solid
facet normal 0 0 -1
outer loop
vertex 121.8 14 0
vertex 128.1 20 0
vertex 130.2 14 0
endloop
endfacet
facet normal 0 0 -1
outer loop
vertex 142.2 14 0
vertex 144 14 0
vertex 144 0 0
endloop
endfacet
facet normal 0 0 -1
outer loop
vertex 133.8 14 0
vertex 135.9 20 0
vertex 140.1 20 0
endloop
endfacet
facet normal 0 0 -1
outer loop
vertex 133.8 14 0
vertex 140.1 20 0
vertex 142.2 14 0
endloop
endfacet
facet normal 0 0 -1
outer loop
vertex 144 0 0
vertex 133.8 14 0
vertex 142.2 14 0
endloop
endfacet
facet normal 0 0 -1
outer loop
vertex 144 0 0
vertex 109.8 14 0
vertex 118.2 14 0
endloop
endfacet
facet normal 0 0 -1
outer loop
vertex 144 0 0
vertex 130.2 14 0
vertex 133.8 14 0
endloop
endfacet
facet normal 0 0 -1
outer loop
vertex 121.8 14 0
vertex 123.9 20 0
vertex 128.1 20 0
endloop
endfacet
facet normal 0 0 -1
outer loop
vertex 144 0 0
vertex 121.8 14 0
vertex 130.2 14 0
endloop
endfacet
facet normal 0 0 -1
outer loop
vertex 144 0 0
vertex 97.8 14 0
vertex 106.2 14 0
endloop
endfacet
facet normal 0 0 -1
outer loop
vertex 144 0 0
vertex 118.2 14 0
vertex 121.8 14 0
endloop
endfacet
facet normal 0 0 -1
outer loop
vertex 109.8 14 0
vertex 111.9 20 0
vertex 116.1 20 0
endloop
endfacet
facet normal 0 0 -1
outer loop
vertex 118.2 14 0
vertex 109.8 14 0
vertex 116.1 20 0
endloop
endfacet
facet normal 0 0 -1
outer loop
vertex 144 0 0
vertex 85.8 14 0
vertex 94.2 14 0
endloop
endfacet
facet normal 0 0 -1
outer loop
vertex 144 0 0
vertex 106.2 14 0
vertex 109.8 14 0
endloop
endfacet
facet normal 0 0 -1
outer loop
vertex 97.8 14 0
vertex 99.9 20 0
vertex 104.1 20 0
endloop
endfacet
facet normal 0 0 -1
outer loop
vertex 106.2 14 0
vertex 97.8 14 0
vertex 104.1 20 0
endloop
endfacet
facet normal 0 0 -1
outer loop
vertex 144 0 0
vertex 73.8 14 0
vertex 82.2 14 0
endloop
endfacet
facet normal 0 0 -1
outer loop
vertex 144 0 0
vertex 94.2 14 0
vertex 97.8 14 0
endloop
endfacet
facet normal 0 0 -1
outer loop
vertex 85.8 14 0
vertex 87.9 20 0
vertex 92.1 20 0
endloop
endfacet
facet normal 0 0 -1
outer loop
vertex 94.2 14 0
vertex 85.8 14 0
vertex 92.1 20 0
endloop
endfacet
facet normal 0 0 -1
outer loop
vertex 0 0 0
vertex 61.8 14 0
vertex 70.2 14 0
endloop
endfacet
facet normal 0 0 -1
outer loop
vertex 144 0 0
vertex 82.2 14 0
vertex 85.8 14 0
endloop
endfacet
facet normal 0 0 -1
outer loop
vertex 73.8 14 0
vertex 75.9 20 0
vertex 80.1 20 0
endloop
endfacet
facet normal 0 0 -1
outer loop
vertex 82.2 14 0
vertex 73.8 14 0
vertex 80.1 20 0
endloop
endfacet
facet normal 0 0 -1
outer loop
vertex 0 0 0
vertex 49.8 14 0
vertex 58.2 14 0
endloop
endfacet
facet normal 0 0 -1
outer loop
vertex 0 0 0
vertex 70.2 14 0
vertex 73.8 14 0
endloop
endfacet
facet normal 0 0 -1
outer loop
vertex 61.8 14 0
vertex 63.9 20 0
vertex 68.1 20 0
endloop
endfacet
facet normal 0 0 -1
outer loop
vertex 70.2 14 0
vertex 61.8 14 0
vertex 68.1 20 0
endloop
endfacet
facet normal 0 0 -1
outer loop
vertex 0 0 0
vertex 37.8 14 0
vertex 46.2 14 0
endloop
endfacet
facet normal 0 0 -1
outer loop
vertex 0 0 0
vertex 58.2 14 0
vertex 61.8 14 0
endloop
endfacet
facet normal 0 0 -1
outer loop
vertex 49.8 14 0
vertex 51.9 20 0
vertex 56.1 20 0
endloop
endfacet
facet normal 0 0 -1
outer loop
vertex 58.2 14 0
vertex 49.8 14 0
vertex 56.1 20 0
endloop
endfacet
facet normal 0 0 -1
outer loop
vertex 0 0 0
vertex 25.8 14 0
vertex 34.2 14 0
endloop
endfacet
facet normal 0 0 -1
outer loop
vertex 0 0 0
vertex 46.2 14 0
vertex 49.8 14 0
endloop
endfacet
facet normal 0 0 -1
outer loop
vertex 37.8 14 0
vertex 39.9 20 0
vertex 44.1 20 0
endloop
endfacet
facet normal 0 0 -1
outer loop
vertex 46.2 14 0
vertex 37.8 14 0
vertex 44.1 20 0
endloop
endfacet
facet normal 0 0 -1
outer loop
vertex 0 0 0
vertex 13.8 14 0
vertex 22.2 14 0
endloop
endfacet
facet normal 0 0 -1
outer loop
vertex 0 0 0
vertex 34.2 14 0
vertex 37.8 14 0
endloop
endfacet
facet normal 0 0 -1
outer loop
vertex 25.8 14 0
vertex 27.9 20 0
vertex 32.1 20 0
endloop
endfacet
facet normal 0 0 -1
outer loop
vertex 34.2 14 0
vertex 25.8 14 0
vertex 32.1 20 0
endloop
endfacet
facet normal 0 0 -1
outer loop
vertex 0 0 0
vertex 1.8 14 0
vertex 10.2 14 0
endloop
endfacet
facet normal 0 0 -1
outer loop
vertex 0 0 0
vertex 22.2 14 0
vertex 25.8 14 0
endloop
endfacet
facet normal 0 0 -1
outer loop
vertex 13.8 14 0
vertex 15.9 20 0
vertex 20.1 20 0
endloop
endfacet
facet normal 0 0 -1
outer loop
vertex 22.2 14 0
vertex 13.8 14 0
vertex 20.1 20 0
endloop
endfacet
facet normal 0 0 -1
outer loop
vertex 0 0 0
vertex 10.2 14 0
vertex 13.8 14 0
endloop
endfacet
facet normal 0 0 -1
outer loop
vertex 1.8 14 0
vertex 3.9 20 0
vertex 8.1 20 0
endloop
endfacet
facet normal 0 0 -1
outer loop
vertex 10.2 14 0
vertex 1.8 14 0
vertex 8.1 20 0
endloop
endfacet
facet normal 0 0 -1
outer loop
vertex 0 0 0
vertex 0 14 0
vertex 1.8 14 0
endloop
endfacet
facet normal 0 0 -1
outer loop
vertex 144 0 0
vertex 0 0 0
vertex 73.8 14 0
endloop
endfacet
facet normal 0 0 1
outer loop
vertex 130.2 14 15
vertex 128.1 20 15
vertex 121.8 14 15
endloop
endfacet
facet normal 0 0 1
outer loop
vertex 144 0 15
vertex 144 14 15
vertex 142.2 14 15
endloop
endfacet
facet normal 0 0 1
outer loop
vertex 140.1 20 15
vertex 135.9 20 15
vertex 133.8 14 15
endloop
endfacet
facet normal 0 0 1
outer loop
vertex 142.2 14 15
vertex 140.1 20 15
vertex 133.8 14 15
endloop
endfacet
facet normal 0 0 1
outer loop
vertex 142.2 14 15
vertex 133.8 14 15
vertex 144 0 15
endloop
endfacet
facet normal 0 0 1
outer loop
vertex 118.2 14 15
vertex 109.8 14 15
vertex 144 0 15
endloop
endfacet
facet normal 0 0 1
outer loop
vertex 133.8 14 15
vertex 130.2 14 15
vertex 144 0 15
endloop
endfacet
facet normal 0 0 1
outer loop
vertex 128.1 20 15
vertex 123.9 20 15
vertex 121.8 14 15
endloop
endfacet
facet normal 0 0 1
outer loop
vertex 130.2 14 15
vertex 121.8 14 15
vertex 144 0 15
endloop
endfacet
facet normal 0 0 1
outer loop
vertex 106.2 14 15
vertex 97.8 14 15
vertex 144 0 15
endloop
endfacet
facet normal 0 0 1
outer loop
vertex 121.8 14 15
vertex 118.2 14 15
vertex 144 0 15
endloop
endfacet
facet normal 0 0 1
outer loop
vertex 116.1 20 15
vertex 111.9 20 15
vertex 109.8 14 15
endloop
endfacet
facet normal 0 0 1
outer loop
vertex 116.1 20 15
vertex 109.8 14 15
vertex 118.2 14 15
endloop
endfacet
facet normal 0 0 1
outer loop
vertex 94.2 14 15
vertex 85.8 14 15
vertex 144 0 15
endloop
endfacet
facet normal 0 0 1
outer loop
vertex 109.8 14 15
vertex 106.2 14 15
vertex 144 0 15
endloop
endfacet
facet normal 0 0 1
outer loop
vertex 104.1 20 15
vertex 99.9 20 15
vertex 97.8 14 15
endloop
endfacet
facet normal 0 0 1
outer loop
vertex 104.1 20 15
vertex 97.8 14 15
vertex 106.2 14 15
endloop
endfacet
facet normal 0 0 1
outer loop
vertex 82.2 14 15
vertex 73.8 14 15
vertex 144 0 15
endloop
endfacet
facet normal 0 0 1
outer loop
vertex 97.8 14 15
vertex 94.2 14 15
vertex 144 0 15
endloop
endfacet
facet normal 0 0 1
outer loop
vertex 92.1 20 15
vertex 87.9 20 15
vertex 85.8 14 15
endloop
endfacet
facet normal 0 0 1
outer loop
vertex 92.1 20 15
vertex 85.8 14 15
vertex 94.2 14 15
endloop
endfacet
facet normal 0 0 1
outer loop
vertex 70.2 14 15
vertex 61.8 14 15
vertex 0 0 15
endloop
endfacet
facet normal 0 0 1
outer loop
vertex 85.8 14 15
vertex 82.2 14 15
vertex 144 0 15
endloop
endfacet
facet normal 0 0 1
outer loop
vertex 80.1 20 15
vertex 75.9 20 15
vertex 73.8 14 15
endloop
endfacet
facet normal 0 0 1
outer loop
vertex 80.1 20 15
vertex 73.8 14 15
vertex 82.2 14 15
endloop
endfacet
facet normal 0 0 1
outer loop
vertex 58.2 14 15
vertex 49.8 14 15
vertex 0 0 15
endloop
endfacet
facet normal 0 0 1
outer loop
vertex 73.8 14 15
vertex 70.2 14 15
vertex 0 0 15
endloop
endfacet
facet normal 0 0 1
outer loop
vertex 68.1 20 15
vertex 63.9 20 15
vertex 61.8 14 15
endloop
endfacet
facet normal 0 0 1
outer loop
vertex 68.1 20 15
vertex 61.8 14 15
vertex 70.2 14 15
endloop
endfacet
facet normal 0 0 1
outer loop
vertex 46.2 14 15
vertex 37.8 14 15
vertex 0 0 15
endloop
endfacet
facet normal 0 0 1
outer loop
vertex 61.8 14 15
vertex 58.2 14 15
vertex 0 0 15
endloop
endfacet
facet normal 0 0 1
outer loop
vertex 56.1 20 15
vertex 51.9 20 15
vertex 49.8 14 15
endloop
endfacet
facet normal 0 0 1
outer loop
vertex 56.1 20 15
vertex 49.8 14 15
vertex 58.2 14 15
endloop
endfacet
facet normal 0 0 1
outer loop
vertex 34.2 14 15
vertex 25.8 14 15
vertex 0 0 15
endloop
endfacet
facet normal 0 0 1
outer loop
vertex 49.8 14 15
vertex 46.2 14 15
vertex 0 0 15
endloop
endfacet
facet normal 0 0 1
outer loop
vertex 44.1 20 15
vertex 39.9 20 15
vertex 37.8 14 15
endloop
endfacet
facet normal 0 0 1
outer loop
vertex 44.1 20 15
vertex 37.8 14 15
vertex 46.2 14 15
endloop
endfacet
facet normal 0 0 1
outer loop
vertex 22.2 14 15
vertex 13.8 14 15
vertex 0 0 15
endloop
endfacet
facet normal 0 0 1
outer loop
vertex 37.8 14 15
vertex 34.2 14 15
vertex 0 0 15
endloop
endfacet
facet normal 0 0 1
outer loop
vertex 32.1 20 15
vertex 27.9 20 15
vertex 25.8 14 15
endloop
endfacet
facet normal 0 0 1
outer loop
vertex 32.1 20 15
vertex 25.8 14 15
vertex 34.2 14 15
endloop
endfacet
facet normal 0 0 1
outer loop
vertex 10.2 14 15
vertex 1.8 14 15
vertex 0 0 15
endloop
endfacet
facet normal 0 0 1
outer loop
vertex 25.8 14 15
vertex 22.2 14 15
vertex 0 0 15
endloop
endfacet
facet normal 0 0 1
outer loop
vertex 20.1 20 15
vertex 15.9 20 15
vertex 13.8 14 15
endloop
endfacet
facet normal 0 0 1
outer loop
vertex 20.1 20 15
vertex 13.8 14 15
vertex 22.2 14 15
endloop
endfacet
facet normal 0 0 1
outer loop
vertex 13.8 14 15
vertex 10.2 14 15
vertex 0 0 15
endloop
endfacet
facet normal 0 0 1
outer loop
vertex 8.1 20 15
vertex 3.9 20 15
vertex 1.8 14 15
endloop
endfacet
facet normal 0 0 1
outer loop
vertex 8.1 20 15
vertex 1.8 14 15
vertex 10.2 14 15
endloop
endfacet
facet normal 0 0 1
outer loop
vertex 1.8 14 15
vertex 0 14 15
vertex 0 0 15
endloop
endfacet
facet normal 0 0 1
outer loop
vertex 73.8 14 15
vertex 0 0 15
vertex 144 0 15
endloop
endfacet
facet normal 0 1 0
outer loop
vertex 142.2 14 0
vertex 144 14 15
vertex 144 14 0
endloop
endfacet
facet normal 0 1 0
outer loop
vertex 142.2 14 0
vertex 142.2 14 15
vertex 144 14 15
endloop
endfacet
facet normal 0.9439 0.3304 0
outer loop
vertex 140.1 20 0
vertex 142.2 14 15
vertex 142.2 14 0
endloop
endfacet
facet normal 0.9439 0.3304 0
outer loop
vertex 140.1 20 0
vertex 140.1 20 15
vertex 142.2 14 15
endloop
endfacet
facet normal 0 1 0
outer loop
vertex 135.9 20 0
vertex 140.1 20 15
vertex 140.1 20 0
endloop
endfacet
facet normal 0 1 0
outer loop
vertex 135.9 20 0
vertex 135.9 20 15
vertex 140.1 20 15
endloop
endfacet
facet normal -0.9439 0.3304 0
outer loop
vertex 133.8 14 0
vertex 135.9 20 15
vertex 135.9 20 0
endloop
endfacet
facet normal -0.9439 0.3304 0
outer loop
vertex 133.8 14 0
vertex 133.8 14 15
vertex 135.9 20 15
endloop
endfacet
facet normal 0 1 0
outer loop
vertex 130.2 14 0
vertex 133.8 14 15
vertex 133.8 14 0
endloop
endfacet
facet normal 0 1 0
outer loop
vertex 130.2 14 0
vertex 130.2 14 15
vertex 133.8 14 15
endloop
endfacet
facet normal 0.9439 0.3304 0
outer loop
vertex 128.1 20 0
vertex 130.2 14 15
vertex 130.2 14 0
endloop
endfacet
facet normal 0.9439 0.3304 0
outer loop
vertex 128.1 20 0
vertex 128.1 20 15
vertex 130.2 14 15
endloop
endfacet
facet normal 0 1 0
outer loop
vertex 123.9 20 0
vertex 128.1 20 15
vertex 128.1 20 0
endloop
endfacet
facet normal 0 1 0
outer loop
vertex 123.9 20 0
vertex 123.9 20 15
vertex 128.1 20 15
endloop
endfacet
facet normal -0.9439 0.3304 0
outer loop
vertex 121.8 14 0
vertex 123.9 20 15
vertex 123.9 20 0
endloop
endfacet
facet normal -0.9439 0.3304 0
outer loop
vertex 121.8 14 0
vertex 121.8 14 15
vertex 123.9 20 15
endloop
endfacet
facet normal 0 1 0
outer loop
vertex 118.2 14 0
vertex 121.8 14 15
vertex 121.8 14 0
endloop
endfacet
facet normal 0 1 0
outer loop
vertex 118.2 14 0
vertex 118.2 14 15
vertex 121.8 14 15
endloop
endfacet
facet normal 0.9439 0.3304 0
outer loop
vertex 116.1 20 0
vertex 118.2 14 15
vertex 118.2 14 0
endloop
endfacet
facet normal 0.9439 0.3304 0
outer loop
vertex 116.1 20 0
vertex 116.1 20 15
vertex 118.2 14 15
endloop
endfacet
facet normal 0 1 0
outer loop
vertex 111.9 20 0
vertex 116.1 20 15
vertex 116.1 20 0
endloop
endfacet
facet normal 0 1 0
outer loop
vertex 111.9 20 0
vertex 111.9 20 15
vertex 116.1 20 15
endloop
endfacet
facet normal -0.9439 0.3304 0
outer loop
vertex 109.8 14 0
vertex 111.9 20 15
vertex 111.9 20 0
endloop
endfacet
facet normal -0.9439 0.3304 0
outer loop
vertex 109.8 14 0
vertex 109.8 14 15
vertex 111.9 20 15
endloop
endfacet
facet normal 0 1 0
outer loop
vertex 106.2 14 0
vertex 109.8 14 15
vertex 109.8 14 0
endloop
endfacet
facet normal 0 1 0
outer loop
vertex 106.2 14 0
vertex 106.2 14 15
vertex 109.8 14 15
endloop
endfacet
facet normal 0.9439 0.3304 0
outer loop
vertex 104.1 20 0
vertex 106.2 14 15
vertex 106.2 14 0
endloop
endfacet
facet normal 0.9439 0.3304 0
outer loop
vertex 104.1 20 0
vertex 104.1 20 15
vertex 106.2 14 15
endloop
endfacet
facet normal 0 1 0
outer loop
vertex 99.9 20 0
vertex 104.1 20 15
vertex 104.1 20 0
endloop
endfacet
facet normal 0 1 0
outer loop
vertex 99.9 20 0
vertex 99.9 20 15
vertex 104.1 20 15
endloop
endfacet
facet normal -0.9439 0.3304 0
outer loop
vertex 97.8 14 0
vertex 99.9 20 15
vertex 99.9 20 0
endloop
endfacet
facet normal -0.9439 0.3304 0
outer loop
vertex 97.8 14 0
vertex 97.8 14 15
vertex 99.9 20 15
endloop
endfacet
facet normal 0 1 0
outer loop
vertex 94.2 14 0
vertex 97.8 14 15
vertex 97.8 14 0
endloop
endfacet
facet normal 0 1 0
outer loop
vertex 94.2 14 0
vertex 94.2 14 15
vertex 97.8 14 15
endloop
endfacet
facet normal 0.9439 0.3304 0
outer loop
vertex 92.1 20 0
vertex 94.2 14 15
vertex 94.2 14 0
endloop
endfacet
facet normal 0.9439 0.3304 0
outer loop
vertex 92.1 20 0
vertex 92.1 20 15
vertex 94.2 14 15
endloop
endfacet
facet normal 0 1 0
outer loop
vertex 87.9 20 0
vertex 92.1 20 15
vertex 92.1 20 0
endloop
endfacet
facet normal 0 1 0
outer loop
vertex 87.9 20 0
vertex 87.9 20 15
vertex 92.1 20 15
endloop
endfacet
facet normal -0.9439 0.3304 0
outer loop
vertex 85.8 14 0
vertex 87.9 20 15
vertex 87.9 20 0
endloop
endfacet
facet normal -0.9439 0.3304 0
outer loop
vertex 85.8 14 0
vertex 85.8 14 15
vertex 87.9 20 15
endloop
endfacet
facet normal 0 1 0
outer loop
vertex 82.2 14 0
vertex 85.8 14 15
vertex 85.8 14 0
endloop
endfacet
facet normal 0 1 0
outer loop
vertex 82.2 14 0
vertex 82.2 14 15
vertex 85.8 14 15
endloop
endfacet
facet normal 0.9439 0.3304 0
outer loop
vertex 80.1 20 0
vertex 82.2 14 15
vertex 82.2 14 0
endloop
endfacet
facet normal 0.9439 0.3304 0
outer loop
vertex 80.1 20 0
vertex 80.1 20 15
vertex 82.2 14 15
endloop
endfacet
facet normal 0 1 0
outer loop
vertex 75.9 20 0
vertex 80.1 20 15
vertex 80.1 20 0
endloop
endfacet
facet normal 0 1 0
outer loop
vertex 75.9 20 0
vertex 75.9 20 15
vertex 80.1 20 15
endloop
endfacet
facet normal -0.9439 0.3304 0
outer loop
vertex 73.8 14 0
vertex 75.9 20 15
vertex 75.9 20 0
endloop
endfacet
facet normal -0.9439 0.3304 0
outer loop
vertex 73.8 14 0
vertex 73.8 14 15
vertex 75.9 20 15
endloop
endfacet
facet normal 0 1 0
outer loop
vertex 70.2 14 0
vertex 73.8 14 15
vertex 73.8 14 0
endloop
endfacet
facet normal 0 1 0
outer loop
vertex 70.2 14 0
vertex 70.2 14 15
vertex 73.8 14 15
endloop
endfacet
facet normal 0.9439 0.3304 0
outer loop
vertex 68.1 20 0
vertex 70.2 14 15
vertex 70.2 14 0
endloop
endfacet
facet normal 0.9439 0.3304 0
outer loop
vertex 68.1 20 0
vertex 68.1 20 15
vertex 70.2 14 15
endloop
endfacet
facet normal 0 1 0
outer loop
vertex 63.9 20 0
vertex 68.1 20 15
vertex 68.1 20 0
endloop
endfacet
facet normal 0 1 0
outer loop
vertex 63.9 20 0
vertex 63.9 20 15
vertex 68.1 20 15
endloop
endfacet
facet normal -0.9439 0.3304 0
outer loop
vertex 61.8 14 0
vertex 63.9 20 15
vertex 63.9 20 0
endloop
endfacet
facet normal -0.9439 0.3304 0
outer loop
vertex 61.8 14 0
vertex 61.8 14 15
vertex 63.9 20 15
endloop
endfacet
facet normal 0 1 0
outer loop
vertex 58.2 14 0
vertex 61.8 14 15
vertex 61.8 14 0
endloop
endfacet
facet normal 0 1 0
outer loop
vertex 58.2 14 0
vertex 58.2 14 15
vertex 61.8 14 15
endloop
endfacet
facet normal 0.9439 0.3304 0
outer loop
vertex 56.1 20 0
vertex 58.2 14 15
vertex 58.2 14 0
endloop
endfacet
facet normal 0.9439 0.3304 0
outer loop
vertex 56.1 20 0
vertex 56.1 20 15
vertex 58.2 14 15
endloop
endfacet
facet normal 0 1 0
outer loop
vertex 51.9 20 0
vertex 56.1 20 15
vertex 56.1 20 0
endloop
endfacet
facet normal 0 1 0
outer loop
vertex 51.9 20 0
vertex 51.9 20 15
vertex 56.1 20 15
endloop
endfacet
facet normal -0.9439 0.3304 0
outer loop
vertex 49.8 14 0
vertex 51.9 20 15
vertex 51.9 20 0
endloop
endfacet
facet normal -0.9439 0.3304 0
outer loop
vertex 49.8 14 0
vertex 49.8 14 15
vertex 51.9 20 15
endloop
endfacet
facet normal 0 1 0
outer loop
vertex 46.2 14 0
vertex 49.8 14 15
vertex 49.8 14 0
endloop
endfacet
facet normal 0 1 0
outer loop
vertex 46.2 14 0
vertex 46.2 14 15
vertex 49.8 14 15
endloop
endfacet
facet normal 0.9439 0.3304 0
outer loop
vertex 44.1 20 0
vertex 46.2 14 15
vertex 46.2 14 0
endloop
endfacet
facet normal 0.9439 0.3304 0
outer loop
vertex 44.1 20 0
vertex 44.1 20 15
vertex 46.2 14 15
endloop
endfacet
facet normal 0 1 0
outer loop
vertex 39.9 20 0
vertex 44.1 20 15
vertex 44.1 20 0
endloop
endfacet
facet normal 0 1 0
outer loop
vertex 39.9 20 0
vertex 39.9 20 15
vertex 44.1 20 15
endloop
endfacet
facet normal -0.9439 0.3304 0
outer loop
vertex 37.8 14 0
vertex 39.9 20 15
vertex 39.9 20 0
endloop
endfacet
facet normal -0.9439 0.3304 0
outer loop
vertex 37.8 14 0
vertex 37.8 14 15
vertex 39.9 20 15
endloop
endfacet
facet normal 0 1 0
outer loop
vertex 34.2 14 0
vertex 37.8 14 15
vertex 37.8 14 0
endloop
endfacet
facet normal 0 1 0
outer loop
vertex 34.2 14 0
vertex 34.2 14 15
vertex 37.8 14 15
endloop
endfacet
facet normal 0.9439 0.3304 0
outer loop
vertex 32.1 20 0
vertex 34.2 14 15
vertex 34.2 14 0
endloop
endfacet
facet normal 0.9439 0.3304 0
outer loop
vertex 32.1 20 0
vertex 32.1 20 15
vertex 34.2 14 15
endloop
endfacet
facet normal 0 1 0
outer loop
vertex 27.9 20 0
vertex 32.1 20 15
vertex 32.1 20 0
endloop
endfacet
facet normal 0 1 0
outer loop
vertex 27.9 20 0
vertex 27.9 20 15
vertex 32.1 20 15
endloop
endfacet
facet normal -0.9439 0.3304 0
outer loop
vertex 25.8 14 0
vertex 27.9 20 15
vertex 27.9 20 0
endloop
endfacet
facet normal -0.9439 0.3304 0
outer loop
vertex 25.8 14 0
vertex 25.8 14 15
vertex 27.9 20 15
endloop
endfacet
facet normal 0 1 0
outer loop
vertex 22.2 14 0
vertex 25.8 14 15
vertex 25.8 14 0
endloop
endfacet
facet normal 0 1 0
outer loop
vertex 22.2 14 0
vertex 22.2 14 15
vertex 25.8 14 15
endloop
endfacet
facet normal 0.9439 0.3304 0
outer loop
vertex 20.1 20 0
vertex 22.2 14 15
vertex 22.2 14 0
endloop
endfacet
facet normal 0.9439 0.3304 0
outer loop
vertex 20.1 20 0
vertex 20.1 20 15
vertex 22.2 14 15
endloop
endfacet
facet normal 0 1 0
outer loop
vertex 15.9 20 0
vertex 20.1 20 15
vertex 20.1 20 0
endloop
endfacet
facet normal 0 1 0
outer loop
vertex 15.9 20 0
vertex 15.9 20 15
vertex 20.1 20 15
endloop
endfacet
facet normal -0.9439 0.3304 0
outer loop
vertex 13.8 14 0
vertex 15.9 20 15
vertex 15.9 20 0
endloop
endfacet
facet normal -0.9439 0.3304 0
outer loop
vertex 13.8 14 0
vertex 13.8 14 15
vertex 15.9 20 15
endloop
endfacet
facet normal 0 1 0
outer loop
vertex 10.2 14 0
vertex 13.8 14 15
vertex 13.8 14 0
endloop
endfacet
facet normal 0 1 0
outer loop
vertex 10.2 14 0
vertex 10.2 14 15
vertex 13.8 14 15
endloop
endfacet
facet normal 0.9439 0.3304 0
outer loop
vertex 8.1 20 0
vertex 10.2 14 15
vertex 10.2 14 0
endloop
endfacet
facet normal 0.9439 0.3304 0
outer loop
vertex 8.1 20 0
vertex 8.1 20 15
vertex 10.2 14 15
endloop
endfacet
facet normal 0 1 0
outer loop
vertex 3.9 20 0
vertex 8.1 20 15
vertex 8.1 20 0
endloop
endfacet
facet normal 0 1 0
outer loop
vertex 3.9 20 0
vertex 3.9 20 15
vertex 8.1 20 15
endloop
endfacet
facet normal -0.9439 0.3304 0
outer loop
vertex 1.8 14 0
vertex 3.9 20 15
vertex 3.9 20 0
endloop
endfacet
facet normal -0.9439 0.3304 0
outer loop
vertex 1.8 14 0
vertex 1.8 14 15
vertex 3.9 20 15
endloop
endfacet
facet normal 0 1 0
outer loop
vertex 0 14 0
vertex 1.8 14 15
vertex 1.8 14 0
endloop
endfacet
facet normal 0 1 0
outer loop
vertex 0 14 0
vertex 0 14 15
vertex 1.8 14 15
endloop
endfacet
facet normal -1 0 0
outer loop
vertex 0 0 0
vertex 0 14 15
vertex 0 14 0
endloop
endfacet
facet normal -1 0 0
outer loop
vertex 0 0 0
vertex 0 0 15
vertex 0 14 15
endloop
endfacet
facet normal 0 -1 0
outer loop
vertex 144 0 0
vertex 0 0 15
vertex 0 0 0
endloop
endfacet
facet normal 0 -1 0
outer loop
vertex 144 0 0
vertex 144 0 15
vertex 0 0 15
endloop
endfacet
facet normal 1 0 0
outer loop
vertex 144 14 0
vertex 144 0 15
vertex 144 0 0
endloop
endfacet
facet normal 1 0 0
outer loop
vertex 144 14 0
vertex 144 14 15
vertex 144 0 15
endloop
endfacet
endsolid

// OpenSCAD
$fn = 32;

// ----------------------------------------------------------------------
// Gear rack: 12 teeth, pitch 12 mm
// ----------------------------------------------------------------------

// --- parameters (mm) ---
teeth = 12;               // number of teeth
pitch = 12;               // tooth pitch, X
root_w = 8.4;             // tooth width at the root
tip_w = 4.2;              // tooth width at the tip
base_h = 14;              // rack body height, Y
tooth_h = 6;              // tooth height above the body
plate_t = 15;             // rack width, Z (extrusion height)

rack_l = teeth * pitch;  // overall length
total_h = base_h + tooth_h;  // overall height

profile = [[0, 0], [144, 0], [144, 14], [142.2, 14], [140.1, 20], [135.9, 20], [133.8, 14], [130.2, 14], [128.1, 20], [123.9, 20], [121.8, 14], [118.2, 14], [116.1, 20], [111.9, 20], [109.8, 14], [106.2, 14], [104.1, 20], [99.9, 20], [97.8, 14], [94.2, 14], [92.1, 20], [87.9, 20], [85.8, 14], [82.2, 14], [80.1, 20], [75.9, 20], [73.8, 14], [70.2, 14], [68.1, 20], [63.9, 20], [61.8, 14], [58.2, 14], [56.1, 20], [51.9, 20], [49.8, 14], [46.2, 14], [44.1, 20], [39.9, 20], [37.8, 14], [34.2, 14], [32.1, 20], [27.9, 20], [25.8, 14], [22.2, 14], [20.1, 20], [15.9, 20], [13.8, 14], [10.2, 14], [8.1, 20], [3.9, 20], [1.8, 14], [0, 14]];  // primary outline, 52 points, counter clockwise

// --- the one profile operation ---
linear_extrude(height = plate_t) polygon(points = profile);
